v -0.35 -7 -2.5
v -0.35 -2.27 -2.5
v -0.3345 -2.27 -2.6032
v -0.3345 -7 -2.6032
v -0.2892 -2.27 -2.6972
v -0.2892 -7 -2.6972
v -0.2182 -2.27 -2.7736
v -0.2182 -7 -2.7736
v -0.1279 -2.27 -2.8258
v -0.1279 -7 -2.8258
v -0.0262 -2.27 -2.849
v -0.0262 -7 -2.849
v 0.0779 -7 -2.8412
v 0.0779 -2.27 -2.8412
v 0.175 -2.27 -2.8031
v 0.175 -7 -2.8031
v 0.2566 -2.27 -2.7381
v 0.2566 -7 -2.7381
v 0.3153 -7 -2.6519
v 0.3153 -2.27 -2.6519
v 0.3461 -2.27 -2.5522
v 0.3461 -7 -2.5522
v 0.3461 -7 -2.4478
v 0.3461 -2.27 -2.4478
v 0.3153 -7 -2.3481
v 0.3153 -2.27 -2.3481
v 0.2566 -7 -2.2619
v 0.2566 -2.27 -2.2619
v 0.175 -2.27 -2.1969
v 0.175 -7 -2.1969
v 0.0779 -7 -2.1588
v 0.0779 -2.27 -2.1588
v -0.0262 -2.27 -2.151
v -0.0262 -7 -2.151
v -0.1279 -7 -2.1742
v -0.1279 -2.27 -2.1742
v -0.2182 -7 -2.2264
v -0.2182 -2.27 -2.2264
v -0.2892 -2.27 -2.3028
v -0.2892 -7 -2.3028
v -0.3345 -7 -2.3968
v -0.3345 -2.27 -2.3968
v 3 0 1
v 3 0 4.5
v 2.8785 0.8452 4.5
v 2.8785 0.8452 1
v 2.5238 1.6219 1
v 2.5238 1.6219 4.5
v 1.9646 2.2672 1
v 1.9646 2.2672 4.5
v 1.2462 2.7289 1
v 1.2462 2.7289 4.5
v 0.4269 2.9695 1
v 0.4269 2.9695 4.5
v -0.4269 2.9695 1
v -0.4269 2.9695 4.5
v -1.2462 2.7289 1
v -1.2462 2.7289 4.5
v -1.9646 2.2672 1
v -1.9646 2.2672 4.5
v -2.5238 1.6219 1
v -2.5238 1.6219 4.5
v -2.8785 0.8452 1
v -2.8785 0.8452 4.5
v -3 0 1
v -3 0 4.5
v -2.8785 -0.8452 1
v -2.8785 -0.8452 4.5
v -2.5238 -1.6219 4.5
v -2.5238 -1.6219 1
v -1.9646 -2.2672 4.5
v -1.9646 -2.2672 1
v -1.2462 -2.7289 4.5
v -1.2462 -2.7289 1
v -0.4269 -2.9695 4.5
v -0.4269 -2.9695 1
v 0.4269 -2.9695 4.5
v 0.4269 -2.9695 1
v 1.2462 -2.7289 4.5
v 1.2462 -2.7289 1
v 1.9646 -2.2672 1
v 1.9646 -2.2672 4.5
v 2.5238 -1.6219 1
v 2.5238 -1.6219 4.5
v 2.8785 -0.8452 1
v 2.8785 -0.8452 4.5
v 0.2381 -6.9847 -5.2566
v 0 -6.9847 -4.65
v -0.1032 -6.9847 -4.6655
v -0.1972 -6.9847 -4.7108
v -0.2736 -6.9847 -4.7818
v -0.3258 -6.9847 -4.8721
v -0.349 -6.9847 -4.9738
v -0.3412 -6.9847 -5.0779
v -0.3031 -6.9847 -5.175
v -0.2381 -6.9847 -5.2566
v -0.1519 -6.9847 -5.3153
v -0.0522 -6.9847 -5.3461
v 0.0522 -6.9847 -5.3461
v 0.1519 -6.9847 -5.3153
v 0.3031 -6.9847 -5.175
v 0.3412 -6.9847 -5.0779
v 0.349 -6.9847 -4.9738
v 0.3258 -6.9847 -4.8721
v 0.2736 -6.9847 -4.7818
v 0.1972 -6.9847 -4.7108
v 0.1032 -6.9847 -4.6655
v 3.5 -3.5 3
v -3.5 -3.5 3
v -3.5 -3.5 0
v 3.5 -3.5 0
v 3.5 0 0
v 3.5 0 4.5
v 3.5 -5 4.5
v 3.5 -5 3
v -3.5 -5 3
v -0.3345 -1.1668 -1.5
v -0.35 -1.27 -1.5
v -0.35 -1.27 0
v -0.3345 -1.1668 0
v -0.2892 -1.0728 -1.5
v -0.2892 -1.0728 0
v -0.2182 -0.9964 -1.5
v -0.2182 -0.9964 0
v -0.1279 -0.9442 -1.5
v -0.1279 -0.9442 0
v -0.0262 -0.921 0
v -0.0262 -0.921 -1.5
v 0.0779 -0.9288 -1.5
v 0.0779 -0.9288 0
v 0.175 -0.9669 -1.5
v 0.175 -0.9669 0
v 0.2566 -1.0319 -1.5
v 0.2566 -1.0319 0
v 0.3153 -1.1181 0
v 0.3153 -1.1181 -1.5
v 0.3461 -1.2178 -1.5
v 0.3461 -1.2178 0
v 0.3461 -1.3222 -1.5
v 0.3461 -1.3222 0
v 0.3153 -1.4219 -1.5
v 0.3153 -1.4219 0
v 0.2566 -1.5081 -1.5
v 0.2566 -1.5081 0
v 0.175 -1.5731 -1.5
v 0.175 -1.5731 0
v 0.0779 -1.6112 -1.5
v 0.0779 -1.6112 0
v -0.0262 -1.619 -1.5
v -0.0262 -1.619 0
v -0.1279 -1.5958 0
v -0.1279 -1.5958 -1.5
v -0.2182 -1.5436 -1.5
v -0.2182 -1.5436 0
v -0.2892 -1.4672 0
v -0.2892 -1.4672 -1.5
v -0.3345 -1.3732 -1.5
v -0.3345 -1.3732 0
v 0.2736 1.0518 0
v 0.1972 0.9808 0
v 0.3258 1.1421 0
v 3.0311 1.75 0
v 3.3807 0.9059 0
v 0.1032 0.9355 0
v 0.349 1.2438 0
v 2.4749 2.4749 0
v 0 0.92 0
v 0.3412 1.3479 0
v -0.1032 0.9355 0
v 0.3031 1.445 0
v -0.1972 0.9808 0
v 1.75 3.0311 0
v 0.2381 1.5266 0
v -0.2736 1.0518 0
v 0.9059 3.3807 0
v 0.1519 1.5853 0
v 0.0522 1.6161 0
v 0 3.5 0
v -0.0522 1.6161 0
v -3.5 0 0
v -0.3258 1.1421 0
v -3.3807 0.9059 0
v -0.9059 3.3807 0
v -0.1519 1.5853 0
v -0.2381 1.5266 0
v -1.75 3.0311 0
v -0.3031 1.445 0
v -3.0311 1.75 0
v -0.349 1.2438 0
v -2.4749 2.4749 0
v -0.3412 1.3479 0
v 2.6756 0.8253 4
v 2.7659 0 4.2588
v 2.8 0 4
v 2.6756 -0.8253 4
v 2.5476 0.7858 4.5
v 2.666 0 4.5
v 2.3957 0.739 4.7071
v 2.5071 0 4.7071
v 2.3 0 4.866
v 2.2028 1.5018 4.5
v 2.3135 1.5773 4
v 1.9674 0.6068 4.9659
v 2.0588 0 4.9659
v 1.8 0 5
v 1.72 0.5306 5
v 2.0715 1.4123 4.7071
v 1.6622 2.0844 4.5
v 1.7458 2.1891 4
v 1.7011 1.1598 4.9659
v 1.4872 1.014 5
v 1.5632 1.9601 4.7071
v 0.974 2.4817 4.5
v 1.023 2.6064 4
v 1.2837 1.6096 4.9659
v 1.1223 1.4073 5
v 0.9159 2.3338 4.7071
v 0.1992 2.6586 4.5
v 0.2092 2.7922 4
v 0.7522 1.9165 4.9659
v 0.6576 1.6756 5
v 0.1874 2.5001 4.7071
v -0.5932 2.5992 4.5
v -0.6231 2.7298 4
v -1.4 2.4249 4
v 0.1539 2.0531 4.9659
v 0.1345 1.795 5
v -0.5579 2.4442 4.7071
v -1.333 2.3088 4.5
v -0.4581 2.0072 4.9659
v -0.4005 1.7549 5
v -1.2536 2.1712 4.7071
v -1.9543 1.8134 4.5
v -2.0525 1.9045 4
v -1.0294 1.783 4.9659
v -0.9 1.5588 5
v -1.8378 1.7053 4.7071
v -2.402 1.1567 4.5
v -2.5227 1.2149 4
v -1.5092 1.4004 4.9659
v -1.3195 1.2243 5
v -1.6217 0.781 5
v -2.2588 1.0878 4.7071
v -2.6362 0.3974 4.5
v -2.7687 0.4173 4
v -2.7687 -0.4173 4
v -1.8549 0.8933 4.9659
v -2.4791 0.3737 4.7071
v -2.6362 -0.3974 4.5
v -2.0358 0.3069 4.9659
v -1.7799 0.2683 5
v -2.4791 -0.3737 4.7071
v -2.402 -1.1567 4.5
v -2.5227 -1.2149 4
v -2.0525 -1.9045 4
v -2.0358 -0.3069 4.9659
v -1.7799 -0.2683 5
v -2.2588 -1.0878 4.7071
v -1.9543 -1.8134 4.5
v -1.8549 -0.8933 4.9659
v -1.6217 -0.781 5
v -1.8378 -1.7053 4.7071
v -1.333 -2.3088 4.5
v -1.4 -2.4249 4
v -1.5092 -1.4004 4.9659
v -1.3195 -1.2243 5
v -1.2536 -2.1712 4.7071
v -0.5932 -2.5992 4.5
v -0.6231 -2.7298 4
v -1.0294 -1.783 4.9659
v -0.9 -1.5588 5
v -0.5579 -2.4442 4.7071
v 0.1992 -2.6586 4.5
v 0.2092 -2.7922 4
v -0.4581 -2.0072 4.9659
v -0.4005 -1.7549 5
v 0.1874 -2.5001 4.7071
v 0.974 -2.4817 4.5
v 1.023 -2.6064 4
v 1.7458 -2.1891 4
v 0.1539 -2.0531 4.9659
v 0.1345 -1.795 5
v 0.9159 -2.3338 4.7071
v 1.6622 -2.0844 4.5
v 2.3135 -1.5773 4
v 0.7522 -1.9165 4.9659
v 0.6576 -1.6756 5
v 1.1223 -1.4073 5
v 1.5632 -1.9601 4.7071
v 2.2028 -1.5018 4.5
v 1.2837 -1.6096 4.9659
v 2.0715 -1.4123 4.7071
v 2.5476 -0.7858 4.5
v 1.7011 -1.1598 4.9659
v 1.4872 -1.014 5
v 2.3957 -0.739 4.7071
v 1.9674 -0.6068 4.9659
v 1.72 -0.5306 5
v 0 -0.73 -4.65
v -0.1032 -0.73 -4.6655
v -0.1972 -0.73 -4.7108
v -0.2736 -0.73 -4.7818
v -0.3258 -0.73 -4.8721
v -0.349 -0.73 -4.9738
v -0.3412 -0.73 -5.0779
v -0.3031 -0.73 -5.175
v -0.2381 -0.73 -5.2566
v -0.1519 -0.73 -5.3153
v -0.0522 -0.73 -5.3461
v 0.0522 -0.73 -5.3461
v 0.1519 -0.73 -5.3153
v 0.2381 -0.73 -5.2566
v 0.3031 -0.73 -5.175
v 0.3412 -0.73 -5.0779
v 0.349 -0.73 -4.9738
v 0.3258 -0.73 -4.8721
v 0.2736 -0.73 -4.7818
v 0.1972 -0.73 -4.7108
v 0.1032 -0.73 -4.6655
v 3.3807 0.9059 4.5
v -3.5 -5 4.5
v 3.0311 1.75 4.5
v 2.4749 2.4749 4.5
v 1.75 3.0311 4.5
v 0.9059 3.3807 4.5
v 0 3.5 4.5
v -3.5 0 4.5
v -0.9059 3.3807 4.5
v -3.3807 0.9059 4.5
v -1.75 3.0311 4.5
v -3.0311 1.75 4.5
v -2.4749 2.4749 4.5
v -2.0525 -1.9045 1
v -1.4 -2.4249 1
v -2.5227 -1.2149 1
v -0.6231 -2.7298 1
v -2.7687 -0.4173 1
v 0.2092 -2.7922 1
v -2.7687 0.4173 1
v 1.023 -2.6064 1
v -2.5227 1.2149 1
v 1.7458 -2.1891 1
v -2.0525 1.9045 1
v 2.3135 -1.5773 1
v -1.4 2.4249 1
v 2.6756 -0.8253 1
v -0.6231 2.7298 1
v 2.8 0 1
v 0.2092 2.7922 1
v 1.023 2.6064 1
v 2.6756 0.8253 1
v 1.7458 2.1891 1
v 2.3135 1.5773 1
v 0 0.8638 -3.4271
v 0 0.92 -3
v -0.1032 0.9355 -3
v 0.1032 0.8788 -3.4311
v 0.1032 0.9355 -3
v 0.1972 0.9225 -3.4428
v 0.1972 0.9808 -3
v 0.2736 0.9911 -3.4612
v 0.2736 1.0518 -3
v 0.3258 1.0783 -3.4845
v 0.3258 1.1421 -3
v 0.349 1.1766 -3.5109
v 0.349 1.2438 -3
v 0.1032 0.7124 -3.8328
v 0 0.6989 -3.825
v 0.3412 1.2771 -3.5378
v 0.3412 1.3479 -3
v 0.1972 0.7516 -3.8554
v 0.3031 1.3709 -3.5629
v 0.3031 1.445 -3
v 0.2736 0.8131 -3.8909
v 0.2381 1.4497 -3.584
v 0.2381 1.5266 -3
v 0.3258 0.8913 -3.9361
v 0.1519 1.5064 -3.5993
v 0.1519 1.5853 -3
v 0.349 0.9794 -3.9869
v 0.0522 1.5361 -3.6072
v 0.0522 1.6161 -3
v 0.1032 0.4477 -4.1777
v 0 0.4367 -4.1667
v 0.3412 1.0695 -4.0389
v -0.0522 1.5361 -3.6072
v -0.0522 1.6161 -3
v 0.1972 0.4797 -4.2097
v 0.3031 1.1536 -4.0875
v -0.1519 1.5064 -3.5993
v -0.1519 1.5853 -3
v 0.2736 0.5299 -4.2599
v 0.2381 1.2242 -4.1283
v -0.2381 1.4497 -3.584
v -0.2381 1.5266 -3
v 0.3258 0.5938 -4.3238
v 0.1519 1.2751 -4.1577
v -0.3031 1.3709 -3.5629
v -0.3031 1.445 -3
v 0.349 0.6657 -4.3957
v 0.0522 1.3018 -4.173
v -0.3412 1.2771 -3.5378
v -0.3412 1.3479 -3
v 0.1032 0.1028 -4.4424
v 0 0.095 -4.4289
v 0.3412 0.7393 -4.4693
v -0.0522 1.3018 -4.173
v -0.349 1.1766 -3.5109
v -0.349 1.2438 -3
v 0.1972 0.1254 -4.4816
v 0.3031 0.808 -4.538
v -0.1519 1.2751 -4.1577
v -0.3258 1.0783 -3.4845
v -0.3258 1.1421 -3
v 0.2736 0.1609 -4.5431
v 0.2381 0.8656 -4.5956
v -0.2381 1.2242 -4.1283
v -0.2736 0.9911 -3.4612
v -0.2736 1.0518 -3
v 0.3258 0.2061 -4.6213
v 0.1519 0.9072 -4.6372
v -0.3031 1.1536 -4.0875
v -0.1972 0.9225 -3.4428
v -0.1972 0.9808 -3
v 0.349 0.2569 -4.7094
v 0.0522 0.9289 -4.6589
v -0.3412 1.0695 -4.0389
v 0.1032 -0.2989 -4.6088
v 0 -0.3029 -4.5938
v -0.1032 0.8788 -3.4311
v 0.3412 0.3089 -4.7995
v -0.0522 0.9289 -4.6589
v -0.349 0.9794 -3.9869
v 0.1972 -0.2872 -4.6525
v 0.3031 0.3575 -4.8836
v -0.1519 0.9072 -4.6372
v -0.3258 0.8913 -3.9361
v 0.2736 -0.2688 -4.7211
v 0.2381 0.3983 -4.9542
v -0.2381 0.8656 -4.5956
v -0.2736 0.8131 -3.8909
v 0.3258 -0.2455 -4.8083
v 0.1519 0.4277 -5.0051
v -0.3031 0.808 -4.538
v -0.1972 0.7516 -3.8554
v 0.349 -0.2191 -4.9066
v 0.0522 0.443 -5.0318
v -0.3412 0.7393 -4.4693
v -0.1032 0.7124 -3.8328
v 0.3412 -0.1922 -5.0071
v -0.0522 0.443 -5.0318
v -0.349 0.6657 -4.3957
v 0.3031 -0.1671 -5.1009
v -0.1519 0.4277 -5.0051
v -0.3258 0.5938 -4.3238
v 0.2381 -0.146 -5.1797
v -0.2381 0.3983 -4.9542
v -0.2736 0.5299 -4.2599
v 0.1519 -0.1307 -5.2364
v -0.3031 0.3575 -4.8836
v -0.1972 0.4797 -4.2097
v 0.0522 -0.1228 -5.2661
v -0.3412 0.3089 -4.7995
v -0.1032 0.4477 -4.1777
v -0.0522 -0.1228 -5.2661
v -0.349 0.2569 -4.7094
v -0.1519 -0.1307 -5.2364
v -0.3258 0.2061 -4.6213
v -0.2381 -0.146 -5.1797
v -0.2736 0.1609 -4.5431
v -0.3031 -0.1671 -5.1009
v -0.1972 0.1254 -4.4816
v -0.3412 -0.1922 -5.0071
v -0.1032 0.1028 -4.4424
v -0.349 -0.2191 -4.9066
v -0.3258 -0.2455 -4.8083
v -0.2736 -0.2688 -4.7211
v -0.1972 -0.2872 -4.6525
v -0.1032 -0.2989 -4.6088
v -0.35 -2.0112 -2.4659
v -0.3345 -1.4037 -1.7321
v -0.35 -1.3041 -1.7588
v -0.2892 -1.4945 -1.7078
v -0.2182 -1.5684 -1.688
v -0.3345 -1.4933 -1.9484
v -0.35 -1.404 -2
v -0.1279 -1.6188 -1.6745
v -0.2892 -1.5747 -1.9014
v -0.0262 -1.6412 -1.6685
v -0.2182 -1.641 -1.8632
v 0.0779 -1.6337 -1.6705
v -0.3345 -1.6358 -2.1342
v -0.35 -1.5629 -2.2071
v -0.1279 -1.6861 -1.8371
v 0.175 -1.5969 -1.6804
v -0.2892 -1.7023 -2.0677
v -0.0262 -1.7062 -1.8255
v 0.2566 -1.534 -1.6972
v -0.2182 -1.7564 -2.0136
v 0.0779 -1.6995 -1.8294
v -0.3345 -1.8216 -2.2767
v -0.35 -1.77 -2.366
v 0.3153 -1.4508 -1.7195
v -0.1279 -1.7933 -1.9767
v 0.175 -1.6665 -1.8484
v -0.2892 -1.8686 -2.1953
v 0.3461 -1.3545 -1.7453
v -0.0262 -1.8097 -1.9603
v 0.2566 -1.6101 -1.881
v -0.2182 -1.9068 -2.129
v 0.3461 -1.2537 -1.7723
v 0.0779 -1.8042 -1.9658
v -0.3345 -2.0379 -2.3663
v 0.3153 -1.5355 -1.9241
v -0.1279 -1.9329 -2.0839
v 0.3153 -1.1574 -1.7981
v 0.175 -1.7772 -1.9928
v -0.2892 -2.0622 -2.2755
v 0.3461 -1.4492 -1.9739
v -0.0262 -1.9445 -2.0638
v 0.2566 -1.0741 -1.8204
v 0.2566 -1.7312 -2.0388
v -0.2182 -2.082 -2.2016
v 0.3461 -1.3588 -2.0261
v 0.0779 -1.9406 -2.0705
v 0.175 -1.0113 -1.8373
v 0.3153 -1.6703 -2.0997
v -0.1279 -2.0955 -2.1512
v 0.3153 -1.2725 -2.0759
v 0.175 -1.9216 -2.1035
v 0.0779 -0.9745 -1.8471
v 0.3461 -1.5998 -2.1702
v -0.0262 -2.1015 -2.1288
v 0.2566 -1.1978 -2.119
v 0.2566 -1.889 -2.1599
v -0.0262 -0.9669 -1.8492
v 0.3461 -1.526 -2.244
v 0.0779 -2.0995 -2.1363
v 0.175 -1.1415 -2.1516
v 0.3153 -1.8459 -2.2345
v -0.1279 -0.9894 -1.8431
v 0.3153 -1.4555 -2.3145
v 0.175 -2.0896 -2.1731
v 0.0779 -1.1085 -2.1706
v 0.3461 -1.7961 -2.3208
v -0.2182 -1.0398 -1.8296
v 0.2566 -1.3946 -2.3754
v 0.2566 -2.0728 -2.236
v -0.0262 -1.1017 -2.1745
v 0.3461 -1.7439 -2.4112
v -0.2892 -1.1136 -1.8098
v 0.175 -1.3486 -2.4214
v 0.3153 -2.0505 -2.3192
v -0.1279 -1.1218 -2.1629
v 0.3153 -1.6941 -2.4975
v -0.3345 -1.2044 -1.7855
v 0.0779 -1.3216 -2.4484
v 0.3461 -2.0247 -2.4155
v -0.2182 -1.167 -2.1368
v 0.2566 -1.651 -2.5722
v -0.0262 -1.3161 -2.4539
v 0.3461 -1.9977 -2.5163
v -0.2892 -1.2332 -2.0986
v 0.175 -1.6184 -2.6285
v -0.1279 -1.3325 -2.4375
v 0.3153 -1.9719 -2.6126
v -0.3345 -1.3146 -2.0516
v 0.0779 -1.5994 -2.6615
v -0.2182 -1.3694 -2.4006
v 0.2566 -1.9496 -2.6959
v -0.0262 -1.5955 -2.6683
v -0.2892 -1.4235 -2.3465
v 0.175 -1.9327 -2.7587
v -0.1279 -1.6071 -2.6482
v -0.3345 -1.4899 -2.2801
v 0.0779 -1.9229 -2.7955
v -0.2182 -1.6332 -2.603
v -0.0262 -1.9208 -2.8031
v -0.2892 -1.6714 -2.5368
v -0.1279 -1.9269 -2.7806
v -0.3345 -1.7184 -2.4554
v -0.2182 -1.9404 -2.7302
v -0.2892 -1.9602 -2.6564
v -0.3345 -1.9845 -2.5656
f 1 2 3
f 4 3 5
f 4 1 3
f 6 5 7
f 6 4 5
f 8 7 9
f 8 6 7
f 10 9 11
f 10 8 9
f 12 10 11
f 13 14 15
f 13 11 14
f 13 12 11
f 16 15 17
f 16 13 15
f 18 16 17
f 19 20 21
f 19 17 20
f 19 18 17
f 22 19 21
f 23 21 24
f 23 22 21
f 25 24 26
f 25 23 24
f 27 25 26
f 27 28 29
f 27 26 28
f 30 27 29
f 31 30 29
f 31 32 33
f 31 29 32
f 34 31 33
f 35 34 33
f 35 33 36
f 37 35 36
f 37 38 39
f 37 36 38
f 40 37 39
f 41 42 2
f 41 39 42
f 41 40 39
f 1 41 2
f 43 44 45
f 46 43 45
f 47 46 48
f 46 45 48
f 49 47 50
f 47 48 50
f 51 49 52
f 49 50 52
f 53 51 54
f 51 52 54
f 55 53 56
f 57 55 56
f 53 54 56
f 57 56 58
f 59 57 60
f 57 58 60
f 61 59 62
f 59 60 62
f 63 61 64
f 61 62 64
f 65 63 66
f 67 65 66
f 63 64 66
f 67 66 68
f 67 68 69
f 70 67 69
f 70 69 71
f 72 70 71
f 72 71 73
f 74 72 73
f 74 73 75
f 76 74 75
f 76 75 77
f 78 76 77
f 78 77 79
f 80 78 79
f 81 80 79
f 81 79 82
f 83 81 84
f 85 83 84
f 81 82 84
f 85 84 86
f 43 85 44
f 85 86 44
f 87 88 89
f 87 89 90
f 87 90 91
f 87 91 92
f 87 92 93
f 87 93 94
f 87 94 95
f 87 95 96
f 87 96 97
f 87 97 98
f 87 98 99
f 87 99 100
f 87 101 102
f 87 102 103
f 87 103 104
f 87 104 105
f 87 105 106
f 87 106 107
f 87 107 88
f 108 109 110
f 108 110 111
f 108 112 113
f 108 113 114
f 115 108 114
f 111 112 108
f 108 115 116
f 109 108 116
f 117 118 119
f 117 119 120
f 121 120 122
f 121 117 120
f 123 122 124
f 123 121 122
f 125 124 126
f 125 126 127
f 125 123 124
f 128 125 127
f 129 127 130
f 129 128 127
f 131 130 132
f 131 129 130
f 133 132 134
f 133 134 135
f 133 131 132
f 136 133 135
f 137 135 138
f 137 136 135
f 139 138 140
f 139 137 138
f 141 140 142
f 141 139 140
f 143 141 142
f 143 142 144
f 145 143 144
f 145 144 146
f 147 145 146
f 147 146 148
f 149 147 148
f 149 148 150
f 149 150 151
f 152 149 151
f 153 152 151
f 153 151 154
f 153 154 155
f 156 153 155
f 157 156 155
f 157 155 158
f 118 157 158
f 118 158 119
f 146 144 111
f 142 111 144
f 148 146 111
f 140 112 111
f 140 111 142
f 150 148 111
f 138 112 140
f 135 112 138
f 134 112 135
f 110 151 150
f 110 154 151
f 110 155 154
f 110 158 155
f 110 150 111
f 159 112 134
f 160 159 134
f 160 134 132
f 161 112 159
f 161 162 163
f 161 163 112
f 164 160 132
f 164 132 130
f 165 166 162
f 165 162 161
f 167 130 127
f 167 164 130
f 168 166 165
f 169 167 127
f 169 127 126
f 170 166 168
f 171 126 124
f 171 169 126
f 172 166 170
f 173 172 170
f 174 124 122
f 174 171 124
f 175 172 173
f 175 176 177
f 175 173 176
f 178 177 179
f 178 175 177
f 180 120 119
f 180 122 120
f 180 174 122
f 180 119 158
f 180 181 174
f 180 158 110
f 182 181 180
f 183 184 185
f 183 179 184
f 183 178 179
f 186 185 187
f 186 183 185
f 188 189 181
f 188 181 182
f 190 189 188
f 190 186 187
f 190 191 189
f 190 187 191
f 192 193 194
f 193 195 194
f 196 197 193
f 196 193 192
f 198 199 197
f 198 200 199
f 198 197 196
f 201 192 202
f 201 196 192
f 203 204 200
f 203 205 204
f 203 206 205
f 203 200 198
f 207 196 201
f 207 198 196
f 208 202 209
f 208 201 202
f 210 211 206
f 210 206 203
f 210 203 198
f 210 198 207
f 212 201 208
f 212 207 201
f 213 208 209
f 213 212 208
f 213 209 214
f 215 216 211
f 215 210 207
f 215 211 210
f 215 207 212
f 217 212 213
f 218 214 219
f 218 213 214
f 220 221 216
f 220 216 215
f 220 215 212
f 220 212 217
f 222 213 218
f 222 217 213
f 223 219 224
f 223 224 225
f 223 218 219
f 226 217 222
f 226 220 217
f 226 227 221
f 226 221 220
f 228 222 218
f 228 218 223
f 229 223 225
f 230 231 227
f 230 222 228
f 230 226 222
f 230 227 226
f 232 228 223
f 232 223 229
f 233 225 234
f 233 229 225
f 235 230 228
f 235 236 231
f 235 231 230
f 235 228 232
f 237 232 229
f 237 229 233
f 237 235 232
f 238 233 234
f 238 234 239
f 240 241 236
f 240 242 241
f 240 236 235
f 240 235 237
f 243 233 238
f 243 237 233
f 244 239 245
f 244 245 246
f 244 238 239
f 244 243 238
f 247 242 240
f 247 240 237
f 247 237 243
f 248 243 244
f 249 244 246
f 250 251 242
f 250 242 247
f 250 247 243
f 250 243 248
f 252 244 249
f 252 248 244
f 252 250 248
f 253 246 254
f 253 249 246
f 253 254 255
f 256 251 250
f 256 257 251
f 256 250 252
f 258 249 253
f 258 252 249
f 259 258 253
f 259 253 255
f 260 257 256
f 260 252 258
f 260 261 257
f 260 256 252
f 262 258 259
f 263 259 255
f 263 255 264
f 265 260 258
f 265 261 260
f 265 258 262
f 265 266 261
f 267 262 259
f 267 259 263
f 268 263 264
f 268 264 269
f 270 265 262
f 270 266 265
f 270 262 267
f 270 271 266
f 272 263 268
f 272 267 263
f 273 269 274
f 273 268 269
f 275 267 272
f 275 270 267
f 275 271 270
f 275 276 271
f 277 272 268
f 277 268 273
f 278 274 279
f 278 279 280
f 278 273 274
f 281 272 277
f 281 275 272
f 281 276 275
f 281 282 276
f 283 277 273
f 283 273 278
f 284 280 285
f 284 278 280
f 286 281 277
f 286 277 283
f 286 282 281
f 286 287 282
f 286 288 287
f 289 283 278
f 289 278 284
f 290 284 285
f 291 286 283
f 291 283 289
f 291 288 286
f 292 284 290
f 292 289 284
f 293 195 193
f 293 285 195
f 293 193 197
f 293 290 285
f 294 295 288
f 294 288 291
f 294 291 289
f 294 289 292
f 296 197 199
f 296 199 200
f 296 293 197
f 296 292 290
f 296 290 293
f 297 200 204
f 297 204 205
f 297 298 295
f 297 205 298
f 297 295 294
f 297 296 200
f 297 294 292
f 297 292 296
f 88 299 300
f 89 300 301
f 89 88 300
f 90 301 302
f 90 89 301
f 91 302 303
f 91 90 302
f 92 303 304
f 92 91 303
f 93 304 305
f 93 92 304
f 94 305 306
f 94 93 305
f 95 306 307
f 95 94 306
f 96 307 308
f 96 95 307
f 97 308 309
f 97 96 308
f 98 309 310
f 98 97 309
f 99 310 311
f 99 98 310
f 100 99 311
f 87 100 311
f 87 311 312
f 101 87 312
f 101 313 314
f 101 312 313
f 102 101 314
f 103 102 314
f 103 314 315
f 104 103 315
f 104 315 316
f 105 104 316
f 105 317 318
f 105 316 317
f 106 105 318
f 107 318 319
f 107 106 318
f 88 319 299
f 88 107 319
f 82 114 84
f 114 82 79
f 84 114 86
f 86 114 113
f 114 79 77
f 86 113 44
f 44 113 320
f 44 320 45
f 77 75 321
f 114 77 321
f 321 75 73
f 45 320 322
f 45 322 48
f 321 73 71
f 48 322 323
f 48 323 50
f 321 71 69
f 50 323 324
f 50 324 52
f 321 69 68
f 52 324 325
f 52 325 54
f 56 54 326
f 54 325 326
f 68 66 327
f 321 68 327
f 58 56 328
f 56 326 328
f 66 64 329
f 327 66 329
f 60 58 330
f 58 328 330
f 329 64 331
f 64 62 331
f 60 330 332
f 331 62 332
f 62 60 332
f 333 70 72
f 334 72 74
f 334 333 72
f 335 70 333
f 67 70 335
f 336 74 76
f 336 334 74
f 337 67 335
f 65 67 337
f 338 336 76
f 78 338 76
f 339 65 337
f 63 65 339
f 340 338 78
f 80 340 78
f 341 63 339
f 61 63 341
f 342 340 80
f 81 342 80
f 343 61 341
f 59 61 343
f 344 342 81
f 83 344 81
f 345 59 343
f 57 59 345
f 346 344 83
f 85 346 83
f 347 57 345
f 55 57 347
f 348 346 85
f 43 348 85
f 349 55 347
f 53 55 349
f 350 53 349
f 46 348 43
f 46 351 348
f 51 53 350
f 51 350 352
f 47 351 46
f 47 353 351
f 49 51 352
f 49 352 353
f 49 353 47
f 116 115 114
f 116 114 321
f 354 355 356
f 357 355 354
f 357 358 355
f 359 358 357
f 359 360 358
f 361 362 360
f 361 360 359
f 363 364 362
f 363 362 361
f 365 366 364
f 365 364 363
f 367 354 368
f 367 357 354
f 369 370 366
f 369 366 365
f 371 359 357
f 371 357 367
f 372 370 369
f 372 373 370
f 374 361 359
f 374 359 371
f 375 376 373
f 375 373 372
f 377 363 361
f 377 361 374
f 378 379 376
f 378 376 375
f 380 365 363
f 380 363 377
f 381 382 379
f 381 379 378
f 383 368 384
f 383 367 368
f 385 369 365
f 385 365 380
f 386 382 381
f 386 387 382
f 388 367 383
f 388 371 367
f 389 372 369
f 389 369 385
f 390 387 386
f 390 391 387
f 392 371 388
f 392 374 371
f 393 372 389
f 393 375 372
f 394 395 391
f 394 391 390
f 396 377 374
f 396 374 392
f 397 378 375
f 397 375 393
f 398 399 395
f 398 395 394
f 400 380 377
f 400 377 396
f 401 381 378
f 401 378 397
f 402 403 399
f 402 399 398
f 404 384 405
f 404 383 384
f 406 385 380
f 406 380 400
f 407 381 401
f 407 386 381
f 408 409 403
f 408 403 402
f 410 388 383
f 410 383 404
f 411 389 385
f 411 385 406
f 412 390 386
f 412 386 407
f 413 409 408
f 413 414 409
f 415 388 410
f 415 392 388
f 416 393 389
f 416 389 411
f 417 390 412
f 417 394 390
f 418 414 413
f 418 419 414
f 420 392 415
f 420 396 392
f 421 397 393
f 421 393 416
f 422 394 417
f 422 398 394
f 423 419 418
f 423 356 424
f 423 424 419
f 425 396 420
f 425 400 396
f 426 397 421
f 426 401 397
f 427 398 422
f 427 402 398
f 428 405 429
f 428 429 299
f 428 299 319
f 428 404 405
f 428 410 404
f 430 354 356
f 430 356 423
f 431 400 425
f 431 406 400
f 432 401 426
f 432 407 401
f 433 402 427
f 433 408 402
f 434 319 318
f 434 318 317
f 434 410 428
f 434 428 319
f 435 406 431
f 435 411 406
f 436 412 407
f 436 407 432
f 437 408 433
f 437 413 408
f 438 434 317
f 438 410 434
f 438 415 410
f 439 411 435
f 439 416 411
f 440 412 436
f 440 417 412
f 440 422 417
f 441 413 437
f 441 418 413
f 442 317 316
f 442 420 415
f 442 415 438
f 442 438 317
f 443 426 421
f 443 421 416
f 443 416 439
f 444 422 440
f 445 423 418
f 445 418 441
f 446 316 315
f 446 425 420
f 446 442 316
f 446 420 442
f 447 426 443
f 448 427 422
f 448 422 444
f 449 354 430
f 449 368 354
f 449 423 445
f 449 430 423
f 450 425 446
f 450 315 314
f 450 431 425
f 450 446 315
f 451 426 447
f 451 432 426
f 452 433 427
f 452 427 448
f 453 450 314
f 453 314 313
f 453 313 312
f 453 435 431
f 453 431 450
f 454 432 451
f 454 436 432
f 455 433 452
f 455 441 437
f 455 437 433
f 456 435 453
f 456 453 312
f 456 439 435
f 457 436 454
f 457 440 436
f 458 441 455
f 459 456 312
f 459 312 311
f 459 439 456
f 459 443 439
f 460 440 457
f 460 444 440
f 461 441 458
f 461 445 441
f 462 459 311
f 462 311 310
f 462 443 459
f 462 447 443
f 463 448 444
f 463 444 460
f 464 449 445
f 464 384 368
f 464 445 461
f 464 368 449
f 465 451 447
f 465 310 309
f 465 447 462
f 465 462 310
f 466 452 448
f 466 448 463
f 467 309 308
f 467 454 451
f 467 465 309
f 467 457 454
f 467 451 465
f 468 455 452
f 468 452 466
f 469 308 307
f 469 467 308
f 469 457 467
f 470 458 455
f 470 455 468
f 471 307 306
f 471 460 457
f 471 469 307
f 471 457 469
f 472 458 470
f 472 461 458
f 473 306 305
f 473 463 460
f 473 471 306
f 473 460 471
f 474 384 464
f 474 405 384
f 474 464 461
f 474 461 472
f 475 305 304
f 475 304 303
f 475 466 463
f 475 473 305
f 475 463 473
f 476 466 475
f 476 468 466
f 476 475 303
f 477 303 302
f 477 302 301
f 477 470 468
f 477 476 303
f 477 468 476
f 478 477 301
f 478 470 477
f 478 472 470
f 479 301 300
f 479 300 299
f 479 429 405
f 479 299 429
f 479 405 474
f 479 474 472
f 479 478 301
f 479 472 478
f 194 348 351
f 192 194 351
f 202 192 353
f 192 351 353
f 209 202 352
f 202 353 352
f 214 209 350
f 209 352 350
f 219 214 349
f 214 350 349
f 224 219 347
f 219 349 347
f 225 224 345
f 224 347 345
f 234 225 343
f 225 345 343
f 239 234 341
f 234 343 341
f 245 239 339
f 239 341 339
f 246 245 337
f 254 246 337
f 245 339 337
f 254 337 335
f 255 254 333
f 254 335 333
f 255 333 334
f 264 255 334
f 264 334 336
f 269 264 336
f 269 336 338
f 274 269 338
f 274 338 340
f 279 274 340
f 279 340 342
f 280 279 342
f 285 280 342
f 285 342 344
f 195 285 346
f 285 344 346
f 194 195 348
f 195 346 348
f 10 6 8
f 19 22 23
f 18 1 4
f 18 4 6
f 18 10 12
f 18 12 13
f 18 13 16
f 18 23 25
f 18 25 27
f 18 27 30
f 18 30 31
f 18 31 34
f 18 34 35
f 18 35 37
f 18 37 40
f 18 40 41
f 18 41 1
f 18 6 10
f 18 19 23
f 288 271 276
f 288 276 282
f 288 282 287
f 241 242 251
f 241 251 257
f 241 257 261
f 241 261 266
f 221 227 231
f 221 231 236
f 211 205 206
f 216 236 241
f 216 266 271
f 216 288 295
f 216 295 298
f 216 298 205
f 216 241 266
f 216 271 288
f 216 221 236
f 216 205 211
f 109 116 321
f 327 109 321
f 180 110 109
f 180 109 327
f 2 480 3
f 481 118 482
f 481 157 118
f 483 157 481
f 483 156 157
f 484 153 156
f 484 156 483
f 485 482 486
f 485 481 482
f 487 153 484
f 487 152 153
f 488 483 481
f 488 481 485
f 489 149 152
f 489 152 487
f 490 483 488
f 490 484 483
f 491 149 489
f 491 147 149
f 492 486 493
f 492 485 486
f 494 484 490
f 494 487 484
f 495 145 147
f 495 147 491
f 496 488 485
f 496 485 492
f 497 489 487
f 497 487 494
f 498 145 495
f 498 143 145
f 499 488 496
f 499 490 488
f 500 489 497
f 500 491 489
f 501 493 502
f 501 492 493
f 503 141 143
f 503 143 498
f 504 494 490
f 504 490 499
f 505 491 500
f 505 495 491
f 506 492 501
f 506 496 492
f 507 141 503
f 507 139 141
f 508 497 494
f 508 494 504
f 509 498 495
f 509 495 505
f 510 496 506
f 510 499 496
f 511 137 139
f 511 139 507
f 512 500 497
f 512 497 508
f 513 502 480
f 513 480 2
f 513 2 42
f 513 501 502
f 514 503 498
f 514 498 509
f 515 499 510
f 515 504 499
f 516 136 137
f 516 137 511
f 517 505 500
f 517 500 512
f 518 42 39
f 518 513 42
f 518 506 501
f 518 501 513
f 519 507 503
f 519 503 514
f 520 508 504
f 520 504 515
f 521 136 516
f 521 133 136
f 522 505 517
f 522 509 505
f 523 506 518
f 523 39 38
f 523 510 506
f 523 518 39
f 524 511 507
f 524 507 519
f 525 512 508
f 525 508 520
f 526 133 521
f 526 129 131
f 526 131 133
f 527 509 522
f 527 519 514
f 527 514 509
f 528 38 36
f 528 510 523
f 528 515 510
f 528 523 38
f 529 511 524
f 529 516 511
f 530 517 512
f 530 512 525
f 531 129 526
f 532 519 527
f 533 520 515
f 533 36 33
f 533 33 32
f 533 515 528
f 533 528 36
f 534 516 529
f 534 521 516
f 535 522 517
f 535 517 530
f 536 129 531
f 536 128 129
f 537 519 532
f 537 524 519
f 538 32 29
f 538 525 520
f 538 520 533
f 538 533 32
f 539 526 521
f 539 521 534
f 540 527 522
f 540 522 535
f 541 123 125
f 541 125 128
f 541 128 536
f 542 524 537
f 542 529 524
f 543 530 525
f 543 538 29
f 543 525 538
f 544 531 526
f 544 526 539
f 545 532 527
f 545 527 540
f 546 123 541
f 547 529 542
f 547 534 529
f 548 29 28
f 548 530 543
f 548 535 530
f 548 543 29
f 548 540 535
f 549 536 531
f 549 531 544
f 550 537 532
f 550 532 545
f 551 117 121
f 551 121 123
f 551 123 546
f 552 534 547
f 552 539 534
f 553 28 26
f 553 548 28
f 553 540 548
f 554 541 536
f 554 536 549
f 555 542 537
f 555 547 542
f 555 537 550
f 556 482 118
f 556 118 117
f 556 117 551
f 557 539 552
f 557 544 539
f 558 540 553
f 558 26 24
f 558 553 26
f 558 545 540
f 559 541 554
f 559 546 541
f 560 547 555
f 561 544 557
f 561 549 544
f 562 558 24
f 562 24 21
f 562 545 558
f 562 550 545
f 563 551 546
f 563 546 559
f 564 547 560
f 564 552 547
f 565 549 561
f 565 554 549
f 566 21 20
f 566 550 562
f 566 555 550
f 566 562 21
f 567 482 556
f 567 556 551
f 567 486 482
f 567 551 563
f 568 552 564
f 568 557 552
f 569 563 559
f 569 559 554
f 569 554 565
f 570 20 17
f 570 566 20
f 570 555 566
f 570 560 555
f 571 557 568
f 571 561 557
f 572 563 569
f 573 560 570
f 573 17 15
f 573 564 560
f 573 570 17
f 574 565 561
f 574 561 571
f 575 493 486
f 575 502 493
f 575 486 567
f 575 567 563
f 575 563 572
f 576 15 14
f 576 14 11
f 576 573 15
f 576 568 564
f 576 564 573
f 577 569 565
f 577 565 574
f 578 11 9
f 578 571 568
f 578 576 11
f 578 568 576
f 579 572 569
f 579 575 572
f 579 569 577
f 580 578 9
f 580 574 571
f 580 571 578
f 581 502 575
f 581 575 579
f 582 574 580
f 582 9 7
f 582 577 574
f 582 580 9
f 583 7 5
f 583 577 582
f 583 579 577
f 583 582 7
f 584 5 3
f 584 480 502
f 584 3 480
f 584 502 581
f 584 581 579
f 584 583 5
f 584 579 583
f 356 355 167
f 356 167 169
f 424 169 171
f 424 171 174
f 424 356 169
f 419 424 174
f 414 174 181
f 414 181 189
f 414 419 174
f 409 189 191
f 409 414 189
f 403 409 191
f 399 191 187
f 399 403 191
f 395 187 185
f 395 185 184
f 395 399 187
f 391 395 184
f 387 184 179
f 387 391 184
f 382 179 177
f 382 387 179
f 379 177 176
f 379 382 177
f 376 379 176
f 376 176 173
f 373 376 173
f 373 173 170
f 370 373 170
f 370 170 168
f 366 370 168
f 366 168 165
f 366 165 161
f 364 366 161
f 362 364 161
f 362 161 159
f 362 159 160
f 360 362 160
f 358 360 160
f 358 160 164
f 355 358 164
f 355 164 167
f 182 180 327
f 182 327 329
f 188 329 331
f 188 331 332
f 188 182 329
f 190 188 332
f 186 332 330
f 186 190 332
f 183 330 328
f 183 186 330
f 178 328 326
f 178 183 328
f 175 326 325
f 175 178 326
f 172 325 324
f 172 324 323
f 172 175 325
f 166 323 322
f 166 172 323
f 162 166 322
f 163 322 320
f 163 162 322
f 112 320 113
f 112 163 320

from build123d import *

# Parameters (mm, degrees)
EXTRUDE_2_DEPTH     = 4.5
SKETCH_2_R          = 3
CUT_EXTRUDE_1_DEPTH = 3.5
SKETCH_3_R          = 2.8
EXTRUDE_3_DEPTH     = 4
CUT_EXTRUDE_2_DEPTH = 1.5
SWEEP_2_PROFILE_R   = 0.35
SWEEP_3_PROFILE_R   = 0.35
FILLET_1_R          = 1


with BuildPart() as part:
    # Эскиз1 → Бобышка-Вытянуть2 (new body)
    with BuildSketch(Plane.XY):
        with BuildLine():
            Line((-3.5, -3.5), (-3.5, 0))
            ThreePointArc((-3.5, 0), (0, 3.5), (3.5, 0))
            Line((3.5, 0), (3.5, -3.5))
            Line((3.5, -3.5), (3.5, -5))
            Line((3.5, -5), (-3.5, -5))
            Line((-3.5, -5), (-3.5, -3.5))
        make_face()
    extrude(amount=EXTRUDE_2_DEPTH)

    # Эскиз2 → Вырез-Вытянуть1 (cut)
    with BuildSketch(Plane.XY.offset(4.5)):
        Circle(SKETCH_2_R)
    extrude(amount=-CUT_EXTRUDE_1_DEPTH, mode=Mode.SUBTRACT)

    # Эскиз3 → Бобышка-Вытянуть3 (add)
    with BuildSketch(Plane.XY.offset(1)):
        Circle(SKETCH_3_R)
    extrude(amount=EXTRUDE_3_DEPTH)

    # Эскиз4 → Вырез-Вытянуть2 (cut)
    with BuildSketch(Plane.XZ.offset(5)):
        Polygon((0.146156233, 3), (-3.5, 3), (-3.5, 0), (3.5, 0), (3.5, 3), align=None)
    extrude(amount=-CUT_EXTRUDE_2_DEPTH, mode=Mode.SUBTRACT)

    # По траектории2: sweep along a path in Эскиз6
    with BuildLine(Plane.ZY) as sweep_2_path:
        Line((0, -1.27), (-1.5, -1.27))
        ThreePointArc((-1.5, -1.27), (-2.207106781, -1.562893219), (-2.5, -2.27))
        Line((-2.5, -2.27), (-2.5, -5))
        Line((-2.5, -5), (-2.5, -7))
    # По траектории2 profile (on start of the path) → По траектории2 (sweep)
    with BuildSketch(Plane(origin=(0, -1.27, 0), x_dir=(-1, 0, 0), z_dir=(0, 0, -1))):
        Circle(SWEEP_2_PROFILE_R)
    sweep(path=sweep_2_path.line)

    # По траектории3: sweep along a path in Эскиз107
    with BuildLine(Plane.ZY) as sweep_3_path:
        Line((0, 1.27), (-3, 1.27))
        ThreePointArc((-3, 1.27), (-4.414213562, 0.684213562), (-5, -0.73))
        Line((-5, -0.73), (-5, -6.984666466))
    # По траектории3 profile (on start of the path) → По траектории3 (sweep)
    with BuildSketch(Plane(origin=(0, 1.27, 0), x_dir=(0, -1, 0), z_dir=(0, 0, -1))):
        Circle(SWEEP_3_PROFILE_R)
    sweep(path=sweep_3_path.line)

    # Скругление1
    fillet_1_edges = [part.edges().sort_by_distance(p)[0] for p in [
        (-2.8, 0, 5),
    ]]
    fillet(fillet_1_edges, radius=FILLET_1_R)


solid = part.part
